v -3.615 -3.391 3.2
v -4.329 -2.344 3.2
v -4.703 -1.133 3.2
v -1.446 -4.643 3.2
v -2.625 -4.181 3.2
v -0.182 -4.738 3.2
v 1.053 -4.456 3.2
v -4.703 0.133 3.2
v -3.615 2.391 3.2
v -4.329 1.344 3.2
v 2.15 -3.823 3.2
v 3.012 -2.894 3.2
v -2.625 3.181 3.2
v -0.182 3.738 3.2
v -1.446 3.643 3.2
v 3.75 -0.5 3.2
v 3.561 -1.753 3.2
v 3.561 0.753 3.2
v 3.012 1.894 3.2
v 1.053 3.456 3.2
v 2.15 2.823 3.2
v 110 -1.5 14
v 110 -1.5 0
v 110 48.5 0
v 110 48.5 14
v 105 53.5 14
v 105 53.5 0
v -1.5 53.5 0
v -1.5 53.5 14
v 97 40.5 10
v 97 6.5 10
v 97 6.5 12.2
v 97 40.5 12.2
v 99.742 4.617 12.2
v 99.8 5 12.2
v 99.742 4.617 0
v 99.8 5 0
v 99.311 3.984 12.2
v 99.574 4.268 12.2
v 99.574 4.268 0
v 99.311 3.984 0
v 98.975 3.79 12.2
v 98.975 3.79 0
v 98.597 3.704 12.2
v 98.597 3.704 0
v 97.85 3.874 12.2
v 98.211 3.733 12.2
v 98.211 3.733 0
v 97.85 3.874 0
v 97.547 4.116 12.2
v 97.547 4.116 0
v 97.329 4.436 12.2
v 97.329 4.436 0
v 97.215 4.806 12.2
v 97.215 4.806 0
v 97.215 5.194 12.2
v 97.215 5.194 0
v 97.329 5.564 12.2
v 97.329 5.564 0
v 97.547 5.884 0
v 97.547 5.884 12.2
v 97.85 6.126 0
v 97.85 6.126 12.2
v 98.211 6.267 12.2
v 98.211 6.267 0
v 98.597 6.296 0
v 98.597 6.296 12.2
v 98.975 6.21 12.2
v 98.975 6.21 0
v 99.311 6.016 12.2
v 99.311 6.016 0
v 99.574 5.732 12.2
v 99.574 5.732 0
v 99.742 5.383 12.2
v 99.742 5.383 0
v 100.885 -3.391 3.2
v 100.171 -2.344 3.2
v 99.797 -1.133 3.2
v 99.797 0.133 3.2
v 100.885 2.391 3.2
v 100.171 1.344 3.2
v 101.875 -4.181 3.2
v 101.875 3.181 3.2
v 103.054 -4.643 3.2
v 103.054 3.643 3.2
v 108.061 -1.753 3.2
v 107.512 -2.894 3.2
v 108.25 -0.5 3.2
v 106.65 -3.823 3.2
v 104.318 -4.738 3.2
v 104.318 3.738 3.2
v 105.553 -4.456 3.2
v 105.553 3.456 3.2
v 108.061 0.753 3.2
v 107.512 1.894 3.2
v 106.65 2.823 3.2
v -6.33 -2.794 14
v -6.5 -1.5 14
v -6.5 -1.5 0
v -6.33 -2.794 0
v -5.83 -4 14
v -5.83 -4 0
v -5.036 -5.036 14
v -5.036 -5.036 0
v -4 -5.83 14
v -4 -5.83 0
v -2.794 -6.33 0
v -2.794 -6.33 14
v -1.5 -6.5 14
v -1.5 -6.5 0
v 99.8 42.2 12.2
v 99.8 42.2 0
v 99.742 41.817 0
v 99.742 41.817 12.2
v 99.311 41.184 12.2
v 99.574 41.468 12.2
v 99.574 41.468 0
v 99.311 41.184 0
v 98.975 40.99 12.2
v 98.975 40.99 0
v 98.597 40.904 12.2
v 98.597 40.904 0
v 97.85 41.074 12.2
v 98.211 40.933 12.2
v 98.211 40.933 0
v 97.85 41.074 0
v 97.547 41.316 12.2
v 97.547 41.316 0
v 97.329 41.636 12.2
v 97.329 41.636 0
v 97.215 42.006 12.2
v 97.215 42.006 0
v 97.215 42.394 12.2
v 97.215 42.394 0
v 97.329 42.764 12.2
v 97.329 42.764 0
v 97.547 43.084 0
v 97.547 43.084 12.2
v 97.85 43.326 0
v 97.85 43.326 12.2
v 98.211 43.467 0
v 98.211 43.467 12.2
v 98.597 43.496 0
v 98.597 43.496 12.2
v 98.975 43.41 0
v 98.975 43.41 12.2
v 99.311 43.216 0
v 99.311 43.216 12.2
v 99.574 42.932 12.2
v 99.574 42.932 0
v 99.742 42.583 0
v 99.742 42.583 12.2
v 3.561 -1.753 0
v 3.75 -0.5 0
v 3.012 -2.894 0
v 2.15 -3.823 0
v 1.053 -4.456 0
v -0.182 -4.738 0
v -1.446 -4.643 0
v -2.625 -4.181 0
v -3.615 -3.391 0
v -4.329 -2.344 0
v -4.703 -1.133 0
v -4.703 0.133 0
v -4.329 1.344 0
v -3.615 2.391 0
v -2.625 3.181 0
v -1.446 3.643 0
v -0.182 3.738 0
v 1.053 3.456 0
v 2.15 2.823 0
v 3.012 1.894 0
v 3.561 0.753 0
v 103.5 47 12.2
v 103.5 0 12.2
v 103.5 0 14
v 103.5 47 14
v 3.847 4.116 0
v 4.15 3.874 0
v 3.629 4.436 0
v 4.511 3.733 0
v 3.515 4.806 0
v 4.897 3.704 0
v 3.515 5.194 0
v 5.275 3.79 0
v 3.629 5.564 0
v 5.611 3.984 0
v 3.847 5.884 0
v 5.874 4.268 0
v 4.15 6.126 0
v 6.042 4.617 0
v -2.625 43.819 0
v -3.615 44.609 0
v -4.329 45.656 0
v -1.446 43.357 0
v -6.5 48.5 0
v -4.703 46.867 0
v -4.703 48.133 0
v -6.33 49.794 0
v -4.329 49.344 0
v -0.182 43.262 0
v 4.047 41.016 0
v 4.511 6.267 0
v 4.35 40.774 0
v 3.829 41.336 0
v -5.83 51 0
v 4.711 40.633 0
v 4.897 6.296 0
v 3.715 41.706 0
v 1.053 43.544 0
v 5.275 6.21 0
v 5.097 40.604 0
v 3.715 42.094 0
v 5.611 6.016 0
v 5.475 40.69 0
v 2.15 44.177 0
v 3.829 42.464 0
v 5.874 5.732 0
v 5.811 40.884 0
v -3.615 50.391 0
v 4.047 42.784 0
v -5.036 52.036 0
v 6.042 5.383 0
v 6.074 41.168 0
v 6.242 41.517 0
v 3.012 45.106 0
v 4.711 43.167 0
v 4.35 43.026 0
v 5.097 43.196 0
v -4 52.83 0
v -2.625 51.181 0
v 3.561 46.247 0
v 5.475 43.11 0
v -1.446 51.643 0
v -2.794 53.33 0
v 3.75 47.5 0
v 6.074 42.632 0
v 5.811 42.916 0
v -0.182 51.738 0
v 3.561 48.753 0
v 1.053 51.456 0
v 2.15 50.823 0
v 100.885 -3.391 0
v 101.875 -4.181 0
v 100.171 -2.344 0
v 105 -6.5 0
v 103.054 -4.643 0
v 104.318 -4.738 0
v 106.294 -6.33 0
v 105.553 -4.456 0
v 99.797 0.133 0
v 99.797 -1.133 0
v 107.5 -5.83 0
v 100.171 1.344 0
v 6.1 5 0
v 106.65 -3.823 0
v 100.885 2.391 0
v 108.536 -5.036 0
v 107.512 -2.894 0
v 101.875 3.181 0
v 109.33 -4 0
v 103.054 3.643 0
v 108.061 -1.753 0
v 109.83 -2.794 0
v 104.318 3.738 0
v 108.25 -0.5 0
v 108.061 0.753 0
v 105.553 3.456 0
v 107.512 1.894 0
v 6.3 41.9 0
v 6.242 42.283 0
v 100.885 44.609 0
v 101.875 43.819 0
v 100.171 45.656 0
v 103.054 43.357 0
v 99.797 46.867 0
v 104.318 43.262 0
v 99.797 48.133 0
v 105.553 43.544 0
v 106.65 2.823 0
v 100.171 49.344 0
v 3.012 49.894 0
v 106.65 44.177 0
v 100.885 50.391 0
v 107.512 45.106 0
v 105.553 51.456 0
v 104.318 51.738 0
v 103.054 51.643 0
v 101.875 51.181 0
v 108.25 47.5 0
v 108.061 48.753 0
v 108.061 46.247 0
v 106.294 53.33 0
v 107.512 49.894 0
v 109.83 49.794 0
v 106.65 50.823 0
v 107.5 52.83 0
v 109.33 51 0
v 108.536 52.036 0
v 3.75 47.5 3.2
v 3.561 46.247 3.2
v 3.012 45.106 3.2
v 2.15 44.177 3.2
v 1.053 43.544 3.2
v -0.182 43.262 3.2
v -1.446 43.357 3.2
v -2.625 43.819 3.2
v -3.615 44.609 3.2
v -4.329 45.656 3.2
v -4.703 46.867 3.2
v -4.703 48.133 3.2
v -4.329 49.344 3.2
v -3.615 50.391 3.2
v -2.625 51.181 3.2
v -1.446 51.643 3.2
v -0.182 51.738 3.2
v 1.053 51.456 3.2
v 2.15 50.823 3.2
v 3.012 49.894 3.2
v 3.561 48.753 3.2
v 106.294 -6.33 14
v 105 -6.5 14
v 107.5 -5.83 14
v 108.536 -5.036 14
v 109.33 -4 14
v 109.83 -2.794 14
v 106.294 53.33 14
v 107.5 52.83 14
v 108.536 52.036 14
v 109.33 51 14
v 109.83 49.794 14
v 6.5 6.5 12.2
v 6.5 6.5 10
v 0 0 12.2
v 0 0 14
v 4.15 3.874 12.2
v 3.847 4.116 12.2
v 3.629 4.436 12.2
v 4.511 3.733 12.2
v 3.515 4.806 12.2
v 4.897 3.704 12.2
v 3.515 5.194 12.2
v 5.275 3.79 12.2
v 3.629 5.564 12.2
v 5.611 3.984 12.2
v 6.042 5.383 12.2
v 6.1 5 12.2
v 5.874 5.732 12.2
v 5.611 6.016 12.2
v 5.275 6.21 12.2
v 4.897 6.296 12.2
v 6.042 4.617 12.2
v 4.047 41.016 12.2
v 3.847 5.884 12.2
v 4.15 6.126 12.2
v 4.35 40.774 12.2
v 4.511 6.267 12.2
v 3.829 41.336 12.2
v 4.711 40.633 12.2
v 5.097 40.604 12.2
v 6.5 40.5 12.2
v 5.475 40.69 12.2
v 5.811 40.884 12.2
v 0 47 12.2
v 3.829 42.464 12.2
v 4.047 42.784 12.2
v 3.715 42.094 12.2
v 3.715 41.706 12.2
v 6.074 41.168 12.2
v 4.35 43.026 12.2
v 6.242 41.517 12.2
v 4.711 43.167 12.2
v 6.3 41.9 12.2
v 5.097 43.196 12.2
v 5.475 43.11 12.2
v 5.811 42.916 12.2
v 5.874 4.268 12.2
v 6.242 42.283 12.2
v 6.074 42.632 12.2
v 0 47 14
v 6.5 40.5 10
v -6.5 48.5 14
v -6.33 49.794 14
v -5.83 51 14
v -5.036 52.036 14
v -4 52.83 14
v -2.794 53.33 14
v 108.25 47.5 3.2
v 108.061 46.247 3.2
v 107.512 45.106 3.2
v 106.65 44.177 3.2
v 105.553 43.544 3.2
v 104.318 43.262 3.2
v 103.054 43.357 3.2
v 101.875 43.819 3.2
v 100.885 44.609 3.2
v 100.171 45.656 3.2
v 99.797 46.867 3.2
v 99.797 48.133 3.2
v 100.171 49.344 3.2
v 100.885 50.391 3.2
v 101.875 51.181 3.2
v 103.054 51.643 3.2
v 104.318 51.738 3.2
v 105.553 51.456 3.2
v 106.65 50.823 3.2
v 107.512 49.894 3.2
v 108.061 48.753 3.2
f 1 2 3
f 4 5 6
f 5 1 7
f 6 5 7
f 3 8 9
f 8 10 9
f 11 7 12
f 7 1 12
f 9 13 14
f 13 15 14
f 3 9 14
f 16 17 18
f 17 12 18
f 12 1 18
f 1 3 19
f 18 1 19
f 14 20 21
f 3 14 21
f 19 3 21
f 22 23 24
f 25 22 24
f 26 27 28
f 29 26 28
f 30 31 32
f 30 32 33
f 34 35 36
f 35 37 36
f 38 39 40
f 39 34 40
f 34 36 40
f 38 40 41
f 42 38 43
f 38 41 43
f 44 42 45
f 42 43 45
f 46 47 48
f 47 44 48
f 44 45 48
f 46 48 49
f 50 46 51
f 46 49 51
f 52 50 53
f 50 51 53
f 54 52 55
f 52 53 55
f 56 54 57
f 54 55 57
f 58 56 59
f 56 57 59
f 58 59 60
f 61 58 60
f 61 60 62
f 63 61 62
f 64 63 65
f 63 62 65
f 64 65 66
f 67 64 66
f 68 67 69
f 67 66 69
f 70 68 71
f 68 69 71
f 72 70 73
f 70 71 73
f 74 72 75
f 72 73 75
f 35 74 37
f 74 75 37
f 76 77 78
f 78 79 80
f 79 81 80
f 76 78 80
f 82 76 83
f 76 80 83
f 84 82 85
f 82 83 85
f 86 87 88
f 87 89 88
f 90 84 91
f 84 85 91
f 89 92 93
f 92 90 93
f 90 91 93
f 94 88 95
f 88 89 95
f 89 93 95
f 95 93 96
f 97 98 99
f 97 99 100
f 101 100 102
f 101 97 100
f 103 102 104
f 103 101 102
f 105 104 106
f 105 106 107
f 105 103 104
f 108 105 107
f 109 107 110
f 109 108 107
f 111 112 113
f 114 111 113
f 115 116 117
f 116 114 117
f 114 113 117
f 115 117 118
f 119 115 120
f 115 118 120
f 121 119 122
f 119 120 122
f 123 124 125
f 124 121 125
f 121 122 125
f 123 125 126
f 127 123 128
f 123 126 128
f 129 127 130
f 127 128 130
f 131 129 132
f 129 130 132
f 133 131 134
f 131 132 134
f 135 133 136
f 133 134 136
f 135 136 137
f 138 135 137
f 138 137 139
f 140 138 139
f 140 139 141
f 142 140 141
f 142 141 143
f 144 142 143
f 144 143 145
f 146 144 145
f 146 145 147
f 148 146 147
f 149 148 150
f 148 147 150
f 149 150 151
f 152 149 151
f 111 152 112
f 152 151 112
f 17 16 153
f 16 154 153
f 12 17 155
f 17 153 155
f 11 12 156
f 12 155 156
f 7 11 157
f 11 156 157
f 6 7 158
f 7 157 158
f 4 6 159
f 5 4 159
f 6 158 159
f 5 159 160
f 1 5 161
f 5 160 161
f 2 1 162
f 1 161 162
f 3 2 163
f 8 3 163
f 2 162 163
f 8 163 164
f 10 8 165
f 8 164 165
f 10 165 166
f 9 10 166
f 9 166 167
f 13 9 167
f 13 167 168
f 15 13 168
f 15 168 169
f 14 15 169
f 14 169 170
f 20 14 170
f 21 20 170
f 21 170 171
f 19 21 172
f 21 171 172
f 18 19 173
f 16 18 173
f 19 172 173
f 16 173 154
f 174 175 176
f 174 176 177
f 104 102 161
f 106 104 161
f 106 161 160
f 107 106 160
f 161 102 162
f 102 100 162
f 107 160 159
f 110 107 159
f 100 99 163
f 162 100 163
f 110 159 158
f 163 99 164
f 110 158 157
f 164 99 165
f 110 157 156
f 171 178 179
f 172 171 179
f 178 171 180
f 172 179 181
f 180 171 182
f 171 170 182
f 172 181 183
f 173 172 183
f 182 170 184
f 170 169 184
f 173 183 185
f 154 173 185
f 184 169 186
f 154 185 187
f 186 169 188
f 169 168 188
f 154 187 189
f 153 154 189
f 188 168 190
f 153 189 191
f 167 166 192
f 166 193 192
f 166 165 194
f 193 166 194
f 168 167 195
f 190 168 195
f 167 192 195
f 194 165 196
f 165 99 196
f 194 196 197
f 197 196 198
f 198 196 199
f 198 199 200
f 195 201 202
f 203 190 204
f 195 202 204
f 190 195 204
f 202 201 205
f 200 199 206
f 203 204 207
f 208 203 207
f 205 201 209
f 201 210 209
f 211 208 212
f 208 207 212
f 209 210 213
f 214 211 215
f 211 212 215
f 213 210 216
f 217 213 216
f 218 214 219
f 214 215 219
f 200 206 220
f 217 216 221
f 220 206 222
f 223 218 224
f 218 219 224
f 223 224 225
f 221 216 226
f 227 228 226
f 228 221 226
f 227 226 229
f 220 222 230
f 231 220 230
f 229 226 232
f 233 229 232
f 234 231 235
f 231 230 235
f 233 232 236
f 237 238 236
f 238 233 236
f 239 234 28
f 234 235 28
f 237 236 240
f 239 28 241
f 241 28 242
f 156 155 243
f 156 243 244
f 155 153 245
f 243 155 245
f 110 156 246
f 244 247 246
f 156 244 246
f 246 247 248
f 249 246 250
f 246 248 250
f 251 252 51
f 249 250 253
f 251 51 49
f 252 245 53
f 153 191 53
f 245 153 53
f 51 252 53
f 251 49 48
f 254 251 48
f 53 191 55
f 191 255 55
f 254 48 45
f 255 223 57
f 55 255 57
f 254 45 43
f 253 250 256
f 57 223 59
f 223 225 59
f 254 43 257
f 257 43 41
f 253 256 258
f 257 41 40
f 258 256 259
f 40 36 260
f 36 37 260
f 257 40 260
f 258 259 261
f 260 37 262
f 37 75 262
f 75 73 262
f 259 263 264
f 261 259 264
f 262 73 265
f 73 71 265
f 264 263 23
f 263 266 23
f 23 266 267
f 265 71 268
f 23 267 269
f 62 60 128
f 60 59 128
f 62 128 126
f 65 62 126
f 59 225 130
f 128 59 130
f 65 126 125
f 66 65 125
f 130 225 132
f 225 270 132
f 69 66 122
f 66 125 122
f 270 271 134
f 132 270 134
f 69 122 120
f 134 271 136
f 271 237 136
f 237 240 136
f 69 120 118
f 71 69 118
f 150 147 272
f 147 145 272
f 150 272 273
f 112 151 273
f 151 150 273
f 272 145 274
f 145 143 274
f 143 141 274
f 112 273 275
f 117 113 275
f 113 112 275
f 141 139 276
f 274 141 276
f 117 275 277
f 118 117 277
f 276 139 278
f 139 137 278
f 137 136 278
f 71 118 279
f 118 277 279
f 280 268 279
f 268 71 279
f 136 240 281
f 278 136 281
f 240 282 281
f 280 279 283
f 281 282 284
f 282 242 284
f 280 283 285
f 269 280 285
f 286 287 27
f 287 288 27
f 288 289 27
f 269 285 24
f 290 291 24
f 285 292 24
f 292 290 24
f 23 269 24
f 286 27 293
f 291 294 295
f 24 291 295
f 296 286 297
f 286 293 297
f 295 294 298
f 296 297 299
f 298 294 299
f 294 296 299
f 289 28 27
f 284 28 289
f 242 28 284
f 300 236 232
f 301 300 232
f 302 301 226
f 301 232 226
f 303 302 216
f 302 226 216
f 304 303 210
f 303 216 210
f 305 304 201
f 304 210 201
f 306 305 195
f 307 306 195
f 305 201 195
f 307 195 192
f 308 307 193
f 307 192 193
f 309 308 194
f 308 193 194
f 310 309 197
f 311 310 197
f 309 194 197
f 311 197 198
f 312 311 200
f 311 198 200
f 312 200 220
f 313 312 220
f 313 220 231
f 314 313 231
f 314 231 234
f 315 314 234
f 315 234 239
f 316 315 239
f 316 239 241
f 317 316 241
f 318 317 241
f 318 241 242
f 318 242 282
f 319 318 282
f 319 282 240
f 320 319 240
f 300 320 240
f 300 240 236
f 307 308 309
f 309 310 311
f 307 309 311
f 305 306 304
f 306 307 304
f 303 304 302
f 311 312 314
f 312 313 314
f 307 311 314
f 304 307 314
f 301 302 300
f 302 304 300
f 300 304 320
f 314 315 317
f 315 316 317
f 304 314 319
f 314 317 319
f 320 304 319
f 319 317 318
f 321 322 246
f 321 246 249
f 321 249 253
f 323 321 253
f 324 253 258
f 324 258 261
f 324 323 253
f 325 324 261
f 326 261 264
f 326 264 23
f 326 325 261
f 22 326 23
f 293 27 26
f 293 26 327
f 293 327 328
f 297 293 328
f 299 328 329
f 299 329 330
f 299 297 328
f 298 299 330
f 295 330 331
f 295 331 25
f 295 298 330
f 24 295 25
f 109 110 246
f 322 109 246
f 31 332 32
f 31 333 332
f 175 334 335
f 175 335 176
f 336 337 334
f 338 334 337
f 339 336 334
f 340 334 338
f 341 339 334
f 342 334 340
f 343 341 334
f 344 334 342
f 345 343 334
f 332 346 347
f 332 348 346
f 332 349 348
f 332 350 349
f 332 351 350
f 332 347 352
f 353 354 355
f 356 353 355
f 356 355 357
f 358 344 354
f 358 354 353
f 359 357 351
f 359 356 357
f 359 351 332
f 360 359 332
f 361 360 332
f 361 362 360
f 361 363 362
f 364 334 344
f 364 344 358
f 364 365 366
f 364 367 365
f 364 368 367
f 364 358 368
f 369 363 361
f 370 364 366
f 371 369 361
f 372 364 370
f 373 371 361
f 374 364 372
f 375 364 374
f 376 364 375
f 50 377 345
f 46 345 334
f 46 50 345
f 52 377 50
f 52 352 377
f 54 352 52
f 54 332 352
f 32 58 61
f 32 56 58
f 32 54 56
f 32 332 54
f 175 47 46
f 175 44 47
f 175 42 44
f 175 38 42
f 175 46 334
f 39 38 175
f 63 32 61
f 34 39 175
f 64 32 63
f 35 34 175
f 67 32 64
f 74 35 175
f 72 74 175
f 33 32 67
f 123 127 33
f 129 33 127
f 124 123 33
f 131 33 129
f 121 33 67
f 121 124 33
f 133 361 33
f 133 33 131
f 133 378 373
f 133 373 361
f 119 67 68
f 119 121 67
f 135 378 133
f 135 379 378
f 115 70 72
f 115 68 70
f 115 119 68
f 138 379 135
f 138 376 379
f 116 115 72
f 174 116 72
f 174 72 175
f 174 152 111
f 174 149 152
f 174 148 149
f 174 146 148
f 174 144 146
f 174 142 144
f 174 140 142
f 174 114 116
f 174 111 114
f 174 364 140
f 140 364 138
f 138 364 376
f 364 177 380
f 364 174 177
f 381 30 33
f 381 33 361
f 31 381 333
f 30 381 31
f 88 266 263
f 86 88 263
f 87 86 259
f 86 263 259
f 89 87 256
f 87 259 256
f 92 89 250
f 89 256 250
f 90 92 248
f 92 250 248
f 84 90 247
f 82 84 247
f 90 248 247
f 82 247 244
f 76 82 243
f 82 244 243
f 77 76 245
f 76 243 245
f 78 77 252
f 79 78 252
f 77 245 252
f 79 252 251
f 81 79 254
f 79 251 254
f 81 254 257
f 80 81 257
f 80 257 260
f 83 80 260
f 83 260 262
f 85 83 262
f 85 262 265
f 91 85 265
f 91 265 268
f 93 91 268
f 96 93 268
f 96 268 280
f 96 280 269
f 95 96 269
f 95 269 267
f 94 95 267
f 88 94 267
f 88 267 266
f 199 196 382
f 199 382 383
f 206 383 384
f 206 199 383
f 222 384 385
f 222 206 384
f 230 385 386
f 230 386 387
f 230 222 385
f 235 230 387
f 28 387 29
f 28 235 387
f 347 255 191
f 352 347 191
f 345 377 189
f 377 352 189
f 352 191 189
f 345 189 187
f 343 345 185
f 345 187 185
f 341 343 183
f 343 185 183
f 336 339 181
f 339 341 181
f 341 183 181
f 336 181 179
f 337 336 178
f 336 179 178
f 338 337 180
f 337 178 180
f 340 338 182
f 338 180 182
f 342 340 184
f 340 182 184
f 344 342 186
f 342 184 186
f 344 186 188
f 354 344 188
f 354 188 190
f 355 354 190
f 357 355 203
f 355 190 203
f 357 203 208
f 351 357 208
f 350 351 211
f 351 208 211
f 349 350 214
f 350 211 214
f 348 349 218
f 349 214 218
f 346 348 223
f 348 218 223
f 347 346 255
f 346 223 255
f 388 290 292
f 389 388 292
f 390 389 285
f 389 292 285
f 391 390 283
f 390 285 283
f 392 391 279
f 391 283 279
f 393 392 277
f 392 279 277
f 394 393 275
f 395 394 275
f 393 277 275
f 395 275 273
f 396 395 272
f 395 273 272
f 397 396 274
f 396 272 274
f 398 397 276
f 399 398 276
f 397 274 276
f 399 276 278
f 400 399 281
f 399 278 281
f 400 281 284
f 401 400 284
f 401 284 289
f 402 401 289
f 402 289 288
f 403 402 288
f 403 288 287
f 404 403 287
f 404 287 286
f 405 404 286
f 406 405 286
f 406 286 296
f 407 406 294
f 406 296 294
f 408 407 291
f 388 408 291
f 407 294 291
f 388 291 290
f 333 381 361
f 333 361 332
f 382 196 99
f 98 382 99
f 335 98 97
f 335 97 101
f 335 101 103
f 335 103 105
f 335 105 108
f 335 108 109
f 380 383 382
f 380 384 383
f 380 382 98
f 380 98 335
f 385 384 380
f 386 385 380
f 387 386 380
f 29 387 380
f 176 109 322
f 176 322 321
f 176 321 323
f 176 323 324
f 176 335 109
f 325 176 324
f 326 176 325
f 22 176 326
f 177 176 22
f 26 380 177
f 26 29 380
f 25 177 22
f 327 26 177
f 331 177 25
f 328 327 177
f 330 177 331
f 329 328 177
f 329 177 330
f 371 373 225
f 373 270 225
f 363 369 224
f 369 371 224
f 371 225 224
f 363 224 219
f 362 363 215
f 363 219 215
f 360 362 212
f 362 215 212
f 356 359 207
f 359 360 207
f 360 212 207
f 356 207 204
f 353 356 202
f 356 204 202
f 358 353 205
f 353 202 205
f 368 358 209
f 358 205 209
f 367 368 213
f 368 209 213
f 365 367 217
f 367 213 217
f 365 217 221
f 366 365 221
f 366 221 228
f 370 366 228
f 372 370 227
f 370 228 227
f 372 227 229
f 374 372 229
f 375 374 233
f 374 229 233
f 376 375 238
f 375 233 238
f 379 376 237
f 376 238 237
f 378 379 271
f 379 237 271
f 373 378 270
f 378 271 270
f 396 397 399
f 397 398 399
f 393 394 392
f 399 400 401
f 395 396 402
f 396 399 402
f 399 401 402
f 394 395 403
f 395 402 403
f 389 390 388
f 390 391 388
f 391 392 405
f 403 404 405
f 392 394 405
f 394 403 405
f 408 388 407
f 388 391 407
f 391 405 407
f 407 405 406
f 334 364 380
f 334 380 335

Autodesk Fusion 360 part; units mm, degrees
sketch "Sketch1" plane through (0, 0, 0) normal (0, 0, 1) x (1, 0, 0)
  line L0 (0, 0) -> (103.5, 0)
  line L1 (103.5, 0) -> (103.5, 47)
  line L2 (103.5, 47) -> (0, 47)
  line L3 (0, 47) -> (0, 0)
  line L4 (-6.5, -6.5) -> (110, -6.5)
  line L5 (110, -6.5) -> (110, 53.5)
  line L6 (110, 53.5) -> (-6.5, 53.5)
  line L7 (-6.5, 53.5) -> (-6.5, -6.5)
  line L8 (0, 0) -> (7.051, 0) construction
  circle A0 centre (4.8, 5) radius 1.3
  circle A1 centre (5, 41.9) radius 1.3
  circle A2 centre (98.5, 42.2) radius 1.3
  circle A3 centre (98.5, 5) radius 1.3
  circle A4 centre (-0.5, -0.5) radius 4.25
  circle A5 centre (104, -0.5) radius 4.25
  circle A6 centre (-0.5, 47.5) radius 4.25
  circle A7 centre (104, 47.5) radius 4.25
  line L9 (6.5, 6.5) -> (97, 6.5)
  line L10 (97, 6.5) -> (97, 40.5)
  line L11 (97, 40.5) -> (6.5, 40.5)
  line L12 (6.5, 40.5) -> (6.5, 6.5)
  dimension "d1" = 103.5
  dimension "d2" = 47
  dimension "d3" = 6.5
  dimension "d6" = 2.6
  dimension "d7" = 2.6
  dimension "d9" = 2.6
  dimension "d11" = 2.6
  dimension "d20" = 5
  dimension "d21" = 5.1
  dimension "d22" = 5
  dimension "d23" = 4.8
  dimension "d24" = 5
  dimension "d25" = 5
  dimension "d26" = 4.8
  dimension "d27" = 5
  dimension "d30" = 8.5
  dimension "d31" = 8.5
  dimension "d32" = 8.5
  dimension "d33" = 8.5
  dimension "d34" = 6
  dimension "d36" = 6
  dimension "d37" = 6
  dimension "d38" = 6
  dimension "d39" = 6
  dimension "d40" = 6
  dimension "d41" = 6
  dimension "d42" = 6
  dimension "d45" = -6.5
extrude "Extrude1" add sketch "Sketch1" along normal blind 10 contours L0 L3 A4 | L0 L3 A4 | L0 L1 L2 L3 A4 A5 A6 A7 | L0 L1 A5 | L0 L1 A5 | L2 L3 A6 | L2 L3 A6 | L1 L2 A7 | L1 L2 A7 | L4 L5 L6 L7 | L9 L10 L11 L12
extrude "Extrude2" add sketch "Sketch1" along normal blind 14 contours L0 L3 A4 | L0 L1 A5 | L2 L3 A6 | L1 L2 A7 | L4 L5 L6 L7 picked at (-2.4457, -2.2102) picked at (105.7715, -2.3893) picked at (-2.4457, 49.2102) picked at (105.7715, 49.3893)
extrude "Extrusion4" add sketch "Sketch1" along normal blind 12.2 contours L0 L3 A4 | L0 L1 L2 L3 A4 A5 A6 A7 | L0 L1 A5 | L2 L3 A6 | L1 L2 A7 picked at (1.6646, 1.6646) picked at (101.8354, 1.6646) picked at (1.6646, 45.3354) picked at (101.8354, 45.3354)
fillet "Fillet1" radius 5 4 edges at (-6.5, 53.5, 7) (110, 53.5, 7) (110, -6.5, 7) (-6.5, -6.5, 7)
extrude "Extrusion3" cut sketch "Sketch1" along normal blind 3.2 contours L0 L3 A4 | L0 L3 A4 | L0 L1 A5 | L0 L1 A5 | L2 L3 A6 | L2 L3 A6 | L1 L2 A7 | L1 L2 A7
